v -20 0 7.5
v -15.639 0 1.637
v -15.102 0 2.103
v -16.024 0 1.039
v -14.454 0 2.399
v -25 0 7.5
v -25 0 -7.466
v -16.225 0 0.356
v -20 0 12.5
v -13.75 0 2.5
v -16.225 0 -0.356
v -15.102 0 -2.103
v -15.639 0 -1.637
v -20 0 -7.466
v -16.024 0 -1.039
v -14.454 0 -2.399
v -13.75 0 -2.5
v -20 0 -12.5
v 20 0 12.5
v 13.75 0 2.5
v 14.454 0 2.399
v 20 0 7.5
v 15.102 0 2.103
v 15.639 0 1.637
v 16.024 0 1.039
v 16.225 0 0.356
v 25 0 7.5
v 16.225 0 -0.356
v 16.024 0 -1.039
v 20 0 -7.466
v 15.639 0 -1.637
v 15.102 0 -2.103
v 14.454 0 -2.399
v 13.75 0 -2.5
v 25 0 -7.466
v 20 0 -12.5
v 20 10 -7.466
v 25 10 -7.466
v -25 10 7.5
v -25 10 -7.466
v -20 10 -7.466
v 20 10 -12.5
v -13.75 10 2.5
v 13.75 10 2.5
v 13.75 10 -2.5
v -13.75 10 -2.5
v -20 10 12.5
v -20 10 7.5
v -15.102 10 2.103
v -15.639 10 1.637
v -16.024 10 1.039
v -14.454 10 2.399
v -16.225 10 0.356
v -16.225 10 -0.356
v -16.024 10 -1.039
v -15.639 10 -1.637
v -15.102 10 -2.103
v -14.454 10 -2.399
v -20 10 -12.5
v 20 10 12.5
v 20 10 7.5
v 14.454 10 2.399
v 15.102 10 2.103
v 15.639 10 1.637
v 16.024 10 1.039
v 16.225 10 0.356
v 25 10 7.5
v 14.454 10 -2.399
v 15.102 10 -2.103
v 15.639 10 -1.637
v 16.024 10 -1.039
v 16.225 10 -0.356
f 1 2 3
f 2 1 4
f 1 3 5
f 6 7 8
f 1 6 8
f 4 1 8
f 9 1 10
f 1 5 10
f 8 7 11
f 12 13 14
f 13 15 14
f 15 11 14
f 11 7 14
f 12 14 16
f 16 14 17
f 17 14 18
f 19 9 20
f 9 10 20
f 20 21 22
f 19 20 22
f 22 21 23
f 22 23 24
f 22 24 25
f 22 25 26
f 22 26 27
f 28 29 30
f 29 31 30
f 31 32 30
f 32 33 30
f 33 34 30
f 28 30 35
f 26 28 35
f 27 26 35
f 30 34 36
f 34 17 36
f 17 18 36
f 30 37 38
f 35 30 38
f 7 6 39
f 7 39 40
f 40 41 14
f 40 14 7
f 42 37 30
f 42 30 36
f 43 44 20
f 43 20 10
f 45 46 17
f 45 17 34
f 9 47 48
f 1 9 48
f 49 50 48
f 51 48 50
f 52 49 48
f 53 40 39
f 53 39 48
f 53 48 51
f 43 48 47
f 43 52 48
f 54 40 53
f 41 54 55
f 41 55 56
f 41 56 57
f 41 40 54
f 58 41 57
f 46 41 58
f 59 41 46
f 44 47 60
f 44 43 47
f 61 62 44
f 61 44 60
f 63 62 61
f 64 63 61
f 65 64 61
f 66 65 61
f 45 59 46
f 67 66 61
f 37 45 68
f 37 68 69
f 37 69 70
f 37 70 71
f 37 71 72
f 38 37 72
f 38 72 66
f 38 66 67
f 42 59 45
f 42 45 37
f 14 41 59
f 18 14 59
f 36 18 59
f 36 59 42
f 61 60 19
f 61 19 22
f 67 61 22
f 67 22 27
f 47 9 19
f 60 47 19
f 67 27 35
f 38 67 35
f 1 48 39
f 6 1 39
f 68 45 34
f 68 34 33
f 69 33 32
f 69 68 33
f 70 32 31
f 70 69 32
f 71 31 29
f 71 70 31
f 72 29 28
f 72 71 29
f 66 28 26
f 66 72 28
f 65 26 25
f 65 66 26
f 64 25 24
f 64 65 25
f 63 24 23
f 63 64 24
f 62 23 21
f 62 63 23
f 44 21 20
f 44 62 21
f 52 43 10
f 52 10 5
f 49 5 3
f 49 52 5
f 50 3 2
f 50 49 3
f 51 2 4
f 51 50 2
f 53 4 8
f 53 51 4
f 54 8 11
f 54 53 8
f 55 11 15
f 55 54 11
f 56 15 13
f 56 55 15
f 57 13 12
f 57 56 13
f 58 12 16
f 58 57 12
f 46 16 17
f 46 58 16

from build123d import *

# Parameters (mm, degrees)
SKETCH2_W           = 50
SKETCH2_H           = 25
BOSS_EXTRUDE1_DEPTH = 10
SKETCH3_W           = 5
SKETCH3_H           = 5.034252603
SKETCH3_H_2         = 5
CUT_EXTRUDE1_DEPTH  = 30.685855218
CUT_EXTRUDE2_DEPTH  = 30.685855218


with BuildPart() as part:
    # Sketch2 → Boss-Extrude1 (new body)
    with BuildSketch(Plane(origin=(0, 0, 0), x_dir=(1, 0, 0), z_dir=(0, 1, 0))):
        Rectangle(SKETCH2_W, SKETCH2_H)
    extrude(amount=BOSS_EXTRUDE1_DEPTH)

    # Sketch3 → Cut-Extrude1 (cut, through all)
    with BuildSketch(Plane(origin=(0, 10, 0), x_dir=(1, 0, 0), z_dir=(0, 1, 0))):
        with Locations((22.5, 9.982873699)):
            Rectangle(SKETCH3_W, SKETCH3_H)
        with Locations((22.5, -10)):
            Rectangle(SKETCH3_W, SKETCH3_H_2)
    cut_extrude1 = extrude(amount=-CUT_EXTRUDE1_DEPTH, mode=Mode.SUBTRACT)

    # Mirror1: Cut-Extrude1 across plane
    add(cut_extrude1.mirror(Plane(origin=(0, 0, 0), x_dir=(0, 0, 1), z_dir=(1, 0, 0))), mode=Mode.SUBTRACT)

    # Sketch4 → Cut-Extrude2 (cut, through all)
    with BuildSketch(Plane(origin=(0, 10, 0), x_dir=(1, 0, 0), z_dir=(0, 1, 0))):
        with BuildLine():
            Line((-13.75, 2.5), (13.75, 2.5))
            ThreePointArc((13.75, 2.5), (16.25, 0), (13.75, -2.5))
            Line((13.75, -2.5), (-13.75, -2.5))
            ThreePointArc((-13.75, -2.5), (-16.25, 0), (-13.75, 2.5))
        make_face()
    extrude(amount=-CUT_EXTRUDE2_DEPTH, mode=Mode.SUBTRACT)


solid = part.part
